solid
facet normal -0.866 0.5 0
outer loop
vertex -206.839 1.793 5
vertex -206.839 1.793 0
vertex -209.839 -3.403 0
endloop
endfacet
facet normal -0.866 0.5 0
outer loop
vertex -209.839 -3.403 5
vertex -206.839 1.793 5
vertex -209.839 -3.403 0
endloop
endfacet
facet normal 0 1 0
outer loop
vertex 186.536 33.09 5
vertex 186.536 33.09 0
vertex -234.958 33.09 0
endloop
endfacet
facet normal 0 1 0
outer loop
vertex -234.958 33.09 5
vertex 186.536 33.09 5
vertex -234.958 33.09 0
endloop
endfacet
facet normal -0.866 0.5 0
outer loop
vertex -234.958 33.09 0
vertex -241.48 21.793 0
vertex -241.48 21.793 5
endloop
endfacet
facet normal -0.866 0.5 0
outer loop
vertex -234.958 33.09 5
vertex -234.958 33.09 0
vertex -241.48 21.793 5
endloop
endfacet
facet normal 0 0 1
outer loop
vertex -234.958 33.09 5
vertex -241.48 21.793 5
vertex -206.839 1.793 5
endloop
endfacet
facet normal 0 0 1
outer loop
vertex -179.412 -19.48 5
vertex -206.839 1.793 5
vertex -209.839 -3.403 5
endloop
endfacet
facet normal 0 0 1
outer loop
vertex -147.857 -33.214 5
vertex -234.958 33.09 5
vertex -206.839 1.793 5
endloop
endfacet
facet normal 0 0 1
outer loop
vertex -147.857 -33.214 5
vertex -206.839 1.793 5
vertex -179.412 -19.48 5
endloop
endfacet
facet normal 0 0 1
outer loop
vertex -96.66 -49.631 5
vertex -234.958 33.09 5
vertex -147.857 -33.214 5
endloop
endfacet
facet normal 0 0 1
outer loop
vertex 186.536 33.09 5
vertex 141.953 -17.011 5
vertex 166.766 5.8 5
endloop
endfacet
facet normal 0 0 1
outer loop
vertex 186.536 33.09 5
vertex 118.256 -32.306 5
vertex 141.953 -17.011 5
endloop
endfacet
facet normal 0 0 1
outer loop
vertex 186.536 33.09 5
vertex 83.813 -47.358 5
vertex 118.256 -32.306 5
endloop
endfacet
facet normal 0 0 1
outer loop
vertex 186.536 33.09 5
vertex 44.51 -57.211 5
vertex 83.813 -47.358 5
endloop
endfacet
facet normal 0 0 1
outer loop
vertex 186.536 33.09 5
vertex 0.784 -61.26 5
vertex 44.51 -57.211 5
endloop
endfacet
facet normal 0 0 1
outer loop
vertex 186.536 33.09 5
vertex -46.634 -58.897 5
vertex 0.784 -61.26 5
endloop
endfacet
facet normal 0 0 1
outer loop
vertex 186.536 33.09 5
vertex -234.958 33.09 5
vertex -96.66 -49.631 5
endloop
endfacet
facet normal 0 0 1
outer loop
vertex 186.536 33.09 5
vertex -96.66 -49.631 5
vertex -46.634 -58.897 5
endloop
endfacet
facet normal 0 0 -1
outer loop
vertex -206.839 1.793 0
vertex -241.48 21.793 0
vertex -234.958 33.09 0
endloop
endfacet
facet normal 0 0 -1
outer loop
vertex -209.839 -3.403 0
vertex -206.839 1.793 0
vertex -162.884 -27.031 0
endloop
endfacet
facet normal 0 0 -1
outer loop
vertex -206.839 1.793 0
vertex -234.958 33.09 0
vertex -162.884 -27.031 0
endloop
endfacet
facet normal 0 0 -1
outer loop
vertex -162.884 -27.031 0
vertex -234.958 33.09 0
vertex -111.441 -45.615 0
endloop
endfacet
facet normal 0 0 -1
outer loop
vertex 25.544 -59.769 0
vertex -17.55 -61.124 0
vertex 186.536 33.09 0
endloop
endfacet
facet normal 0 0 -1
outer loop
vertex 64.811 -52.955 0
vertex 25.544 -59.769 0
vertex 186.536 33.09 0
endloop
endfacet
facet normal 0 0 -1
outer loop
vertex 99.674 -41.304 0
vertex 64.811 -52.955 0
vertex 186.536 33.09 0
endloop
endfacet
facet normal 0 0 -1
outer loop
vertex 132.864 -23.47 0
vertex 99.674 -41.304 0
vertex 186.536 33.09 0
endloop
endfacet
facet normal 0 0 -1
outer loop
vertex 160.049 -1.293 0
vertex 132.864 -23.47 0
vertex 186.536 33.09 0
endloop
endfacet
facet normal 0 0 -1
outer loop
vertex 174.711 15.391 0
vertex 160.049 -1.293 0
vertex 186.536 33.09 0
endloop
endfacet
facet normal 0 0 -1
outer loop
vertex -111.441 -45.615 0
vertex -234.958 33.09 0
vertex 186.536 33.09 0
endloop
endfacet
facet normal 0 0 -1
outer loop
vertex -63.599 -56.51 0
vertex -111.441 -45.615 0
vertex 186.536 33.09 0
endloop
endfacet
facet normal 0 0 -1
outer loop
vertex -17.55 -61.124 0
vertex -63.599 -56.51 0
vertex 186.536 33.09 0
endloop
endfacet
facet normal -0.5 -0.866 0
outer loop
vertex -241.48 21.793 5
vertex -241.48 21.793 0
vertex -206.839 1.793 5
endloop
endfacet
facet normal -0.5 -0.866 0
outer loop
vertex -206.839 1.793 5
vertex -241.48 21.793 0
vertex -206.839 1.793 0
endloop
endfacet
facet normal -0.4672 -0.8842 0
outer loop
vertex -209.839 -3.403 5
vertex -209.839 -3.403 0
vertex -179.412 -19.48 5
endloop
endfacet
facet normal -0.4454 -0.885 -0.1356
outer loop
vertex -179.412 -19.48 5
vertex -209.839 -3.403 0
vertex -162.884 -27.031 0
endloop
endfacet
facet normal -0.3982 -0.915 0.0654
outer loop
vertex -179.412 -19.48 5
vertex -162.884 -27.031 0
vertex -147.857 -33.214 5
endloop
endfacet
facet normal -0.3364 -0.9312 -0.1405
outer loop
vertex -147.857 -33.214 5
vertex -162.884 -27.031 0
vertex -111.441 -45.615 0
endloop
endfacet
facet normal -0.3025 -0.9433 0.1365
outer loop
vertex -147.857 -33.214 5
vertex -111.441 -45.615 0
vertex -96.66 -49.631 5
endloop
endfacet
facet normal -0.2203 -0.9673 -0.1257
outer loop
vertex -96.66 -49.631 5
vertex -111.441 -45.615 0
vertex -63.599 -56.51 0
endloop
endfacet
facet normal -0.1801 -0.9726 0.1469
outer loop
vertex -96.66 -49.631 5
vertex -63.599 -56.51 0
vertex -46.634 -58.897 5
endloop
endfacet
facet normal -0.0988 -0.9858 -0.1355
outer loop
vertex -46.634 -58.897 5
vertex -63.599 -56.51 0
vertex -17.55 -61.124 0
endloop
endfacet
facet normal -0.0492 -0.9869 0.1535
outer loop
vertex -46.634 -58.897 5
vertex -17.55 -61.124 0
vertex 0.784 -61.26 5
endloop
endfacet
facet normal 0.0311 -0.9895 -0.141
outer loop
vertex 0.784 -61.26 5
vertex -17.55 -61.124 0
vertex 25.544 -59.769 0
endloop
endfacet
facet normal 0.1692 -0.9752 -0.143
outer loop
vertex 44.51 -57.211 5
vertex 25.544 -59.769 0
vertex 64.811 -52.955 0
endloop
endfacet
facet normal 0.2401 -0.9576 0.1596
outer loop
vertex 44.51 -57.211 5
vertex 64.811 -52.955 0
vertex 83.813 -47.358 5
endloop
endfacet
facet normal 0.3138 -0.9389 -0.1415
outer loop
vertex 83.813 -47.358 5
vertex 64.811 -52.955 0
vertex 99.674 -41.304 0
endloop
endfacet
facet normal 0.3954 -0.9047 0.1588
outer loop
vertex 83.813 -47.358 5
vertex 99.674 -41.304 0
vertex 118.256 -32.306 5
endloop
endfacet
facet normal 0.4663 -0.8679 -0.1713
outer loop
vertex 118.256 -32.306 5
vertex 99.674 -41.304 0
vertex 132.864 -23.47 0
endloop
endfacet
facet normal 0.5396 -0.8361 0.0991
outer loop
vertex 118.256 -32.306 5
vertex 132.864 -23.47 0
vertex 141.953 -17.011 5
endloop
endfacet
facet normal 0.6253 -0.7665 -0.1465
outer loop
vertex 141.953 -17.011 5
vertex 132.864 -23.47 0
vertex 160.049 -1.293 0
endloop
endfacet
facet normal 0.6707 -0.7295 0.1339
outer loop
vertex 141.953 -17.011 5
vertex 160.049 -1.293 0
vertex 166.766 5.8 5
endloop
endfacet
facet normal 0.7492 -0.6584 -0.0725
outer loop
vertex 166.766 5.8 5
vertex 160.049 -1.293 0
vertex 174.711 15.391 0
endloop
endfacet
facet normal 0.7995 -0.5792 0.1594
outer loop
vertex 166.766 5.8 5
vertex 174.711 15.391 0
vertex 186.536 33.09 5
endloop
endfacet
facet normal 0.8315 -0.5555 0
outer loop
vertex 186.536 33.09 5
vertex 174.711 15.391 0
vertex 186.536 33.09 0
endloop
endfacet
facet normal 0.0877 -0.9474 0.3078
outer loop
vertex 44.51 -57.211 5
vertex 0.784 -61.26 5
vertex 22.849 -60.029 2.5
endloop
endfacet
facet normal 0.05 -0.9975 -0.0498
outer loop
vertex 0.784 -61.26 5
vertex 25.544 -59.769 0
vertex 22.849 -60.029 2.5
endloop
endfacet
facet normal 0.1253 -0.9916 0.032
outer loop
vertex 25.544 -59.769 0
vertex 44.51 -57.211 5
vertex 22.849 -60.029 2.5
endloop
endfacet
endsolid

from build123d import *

# Parameters (mm, degrees)
BOSS_EXTRUDE1_DEPTH = 5
CUT_EXTRUDE2_DEPTH  = 274.862320579
CUT_EXTRUDE3_REACH  = 268.706
SKETCH4_W           = 22.592590208
SKETCH4_H           = 5
CUT_EXTRUDE4_DEPTH  = 251.628305478


with BuildPart() as part:
    # Sketch1 → Boss-Extrude1 (new body)
    with BuildSketch(Plane.XY):
        Polygon((-99.840598923, -66.910346562), (128.800871466, -66.910346562), (186.535898385, 33.089653438), (-263.00567968, 33.089653438), (-265.51567968, 28.742205911), align=None)
    extrude(amount=BOSS_EXTRUDE1_DEPTH)

    # Sketch3 → Cut-Extrude2 (cut, through all)
    with BuildSketch(Plane.XY):
        Polygon((-209.838906471, -3.402794089), (-265.51567968, 28.742205911), (-262.51567968, 33.938358334), (-206.838906471, 1.793358334), align=None)
    extrude(amount=CUT_EXTRUDE2_DEPTH, mode=Mode.SUBTRACT)

    # Sketch4 → Cut-Extrude3 (cut, up to next)
    with BuildSketch(Plane(origin=(-50.93317968, -88.218854997, 0), x_dir=(0.8660254037844388, -0.4999999999999997, 0), z_dir=(-0.49999999999999983, -0.8660254037844389, 0)), mode=Mode.PRIVATE) as cut_extrude3_sk1:
        with Locations((-231.320721766, 2.5)):
            Rectangle(SKETCH4_W, SKETCH4_H)
    cut_extrude3_tool1 = extrude(cut_extrude3_sk1.sketch, amount=-CUT_EXTRUDE3_REACH, mode=Mode.PRIVATE) & part.part
    add(cut_extrude3_tool1.solids().sort_by_distance((-251.262801, 27.441506, 2.5))[0], mode=Mode.SUBTRACT)

    # Sketch5 → Cut-Extrude4 (cut, through all)
    with BuildSketch(Plane.XY):
        with BuildLine():
            Line((-209.838906471, -3.402794089), (71.640503869, -165.91500742))
            Line((71.640503869, -165.91500742), (186.535898385, 33.089653438))
            add(Edge.make_bspline(
                [(-209.838906471, -3.402794089), (71.640503869, -165.91500742), (186.535898385, 33.089653438)],
                knots=[4.71238898, 4.71238898, 4.71238898, 6.283185307, 6.283185307, 6.283185307], degree=2, weights=[1, 0.707106781, 1]))
        make_face()
    extrude(amount=CUT_EXTRUDE4_DEPTH, mode=Mode.SUBTRACT)


solid = part.part
